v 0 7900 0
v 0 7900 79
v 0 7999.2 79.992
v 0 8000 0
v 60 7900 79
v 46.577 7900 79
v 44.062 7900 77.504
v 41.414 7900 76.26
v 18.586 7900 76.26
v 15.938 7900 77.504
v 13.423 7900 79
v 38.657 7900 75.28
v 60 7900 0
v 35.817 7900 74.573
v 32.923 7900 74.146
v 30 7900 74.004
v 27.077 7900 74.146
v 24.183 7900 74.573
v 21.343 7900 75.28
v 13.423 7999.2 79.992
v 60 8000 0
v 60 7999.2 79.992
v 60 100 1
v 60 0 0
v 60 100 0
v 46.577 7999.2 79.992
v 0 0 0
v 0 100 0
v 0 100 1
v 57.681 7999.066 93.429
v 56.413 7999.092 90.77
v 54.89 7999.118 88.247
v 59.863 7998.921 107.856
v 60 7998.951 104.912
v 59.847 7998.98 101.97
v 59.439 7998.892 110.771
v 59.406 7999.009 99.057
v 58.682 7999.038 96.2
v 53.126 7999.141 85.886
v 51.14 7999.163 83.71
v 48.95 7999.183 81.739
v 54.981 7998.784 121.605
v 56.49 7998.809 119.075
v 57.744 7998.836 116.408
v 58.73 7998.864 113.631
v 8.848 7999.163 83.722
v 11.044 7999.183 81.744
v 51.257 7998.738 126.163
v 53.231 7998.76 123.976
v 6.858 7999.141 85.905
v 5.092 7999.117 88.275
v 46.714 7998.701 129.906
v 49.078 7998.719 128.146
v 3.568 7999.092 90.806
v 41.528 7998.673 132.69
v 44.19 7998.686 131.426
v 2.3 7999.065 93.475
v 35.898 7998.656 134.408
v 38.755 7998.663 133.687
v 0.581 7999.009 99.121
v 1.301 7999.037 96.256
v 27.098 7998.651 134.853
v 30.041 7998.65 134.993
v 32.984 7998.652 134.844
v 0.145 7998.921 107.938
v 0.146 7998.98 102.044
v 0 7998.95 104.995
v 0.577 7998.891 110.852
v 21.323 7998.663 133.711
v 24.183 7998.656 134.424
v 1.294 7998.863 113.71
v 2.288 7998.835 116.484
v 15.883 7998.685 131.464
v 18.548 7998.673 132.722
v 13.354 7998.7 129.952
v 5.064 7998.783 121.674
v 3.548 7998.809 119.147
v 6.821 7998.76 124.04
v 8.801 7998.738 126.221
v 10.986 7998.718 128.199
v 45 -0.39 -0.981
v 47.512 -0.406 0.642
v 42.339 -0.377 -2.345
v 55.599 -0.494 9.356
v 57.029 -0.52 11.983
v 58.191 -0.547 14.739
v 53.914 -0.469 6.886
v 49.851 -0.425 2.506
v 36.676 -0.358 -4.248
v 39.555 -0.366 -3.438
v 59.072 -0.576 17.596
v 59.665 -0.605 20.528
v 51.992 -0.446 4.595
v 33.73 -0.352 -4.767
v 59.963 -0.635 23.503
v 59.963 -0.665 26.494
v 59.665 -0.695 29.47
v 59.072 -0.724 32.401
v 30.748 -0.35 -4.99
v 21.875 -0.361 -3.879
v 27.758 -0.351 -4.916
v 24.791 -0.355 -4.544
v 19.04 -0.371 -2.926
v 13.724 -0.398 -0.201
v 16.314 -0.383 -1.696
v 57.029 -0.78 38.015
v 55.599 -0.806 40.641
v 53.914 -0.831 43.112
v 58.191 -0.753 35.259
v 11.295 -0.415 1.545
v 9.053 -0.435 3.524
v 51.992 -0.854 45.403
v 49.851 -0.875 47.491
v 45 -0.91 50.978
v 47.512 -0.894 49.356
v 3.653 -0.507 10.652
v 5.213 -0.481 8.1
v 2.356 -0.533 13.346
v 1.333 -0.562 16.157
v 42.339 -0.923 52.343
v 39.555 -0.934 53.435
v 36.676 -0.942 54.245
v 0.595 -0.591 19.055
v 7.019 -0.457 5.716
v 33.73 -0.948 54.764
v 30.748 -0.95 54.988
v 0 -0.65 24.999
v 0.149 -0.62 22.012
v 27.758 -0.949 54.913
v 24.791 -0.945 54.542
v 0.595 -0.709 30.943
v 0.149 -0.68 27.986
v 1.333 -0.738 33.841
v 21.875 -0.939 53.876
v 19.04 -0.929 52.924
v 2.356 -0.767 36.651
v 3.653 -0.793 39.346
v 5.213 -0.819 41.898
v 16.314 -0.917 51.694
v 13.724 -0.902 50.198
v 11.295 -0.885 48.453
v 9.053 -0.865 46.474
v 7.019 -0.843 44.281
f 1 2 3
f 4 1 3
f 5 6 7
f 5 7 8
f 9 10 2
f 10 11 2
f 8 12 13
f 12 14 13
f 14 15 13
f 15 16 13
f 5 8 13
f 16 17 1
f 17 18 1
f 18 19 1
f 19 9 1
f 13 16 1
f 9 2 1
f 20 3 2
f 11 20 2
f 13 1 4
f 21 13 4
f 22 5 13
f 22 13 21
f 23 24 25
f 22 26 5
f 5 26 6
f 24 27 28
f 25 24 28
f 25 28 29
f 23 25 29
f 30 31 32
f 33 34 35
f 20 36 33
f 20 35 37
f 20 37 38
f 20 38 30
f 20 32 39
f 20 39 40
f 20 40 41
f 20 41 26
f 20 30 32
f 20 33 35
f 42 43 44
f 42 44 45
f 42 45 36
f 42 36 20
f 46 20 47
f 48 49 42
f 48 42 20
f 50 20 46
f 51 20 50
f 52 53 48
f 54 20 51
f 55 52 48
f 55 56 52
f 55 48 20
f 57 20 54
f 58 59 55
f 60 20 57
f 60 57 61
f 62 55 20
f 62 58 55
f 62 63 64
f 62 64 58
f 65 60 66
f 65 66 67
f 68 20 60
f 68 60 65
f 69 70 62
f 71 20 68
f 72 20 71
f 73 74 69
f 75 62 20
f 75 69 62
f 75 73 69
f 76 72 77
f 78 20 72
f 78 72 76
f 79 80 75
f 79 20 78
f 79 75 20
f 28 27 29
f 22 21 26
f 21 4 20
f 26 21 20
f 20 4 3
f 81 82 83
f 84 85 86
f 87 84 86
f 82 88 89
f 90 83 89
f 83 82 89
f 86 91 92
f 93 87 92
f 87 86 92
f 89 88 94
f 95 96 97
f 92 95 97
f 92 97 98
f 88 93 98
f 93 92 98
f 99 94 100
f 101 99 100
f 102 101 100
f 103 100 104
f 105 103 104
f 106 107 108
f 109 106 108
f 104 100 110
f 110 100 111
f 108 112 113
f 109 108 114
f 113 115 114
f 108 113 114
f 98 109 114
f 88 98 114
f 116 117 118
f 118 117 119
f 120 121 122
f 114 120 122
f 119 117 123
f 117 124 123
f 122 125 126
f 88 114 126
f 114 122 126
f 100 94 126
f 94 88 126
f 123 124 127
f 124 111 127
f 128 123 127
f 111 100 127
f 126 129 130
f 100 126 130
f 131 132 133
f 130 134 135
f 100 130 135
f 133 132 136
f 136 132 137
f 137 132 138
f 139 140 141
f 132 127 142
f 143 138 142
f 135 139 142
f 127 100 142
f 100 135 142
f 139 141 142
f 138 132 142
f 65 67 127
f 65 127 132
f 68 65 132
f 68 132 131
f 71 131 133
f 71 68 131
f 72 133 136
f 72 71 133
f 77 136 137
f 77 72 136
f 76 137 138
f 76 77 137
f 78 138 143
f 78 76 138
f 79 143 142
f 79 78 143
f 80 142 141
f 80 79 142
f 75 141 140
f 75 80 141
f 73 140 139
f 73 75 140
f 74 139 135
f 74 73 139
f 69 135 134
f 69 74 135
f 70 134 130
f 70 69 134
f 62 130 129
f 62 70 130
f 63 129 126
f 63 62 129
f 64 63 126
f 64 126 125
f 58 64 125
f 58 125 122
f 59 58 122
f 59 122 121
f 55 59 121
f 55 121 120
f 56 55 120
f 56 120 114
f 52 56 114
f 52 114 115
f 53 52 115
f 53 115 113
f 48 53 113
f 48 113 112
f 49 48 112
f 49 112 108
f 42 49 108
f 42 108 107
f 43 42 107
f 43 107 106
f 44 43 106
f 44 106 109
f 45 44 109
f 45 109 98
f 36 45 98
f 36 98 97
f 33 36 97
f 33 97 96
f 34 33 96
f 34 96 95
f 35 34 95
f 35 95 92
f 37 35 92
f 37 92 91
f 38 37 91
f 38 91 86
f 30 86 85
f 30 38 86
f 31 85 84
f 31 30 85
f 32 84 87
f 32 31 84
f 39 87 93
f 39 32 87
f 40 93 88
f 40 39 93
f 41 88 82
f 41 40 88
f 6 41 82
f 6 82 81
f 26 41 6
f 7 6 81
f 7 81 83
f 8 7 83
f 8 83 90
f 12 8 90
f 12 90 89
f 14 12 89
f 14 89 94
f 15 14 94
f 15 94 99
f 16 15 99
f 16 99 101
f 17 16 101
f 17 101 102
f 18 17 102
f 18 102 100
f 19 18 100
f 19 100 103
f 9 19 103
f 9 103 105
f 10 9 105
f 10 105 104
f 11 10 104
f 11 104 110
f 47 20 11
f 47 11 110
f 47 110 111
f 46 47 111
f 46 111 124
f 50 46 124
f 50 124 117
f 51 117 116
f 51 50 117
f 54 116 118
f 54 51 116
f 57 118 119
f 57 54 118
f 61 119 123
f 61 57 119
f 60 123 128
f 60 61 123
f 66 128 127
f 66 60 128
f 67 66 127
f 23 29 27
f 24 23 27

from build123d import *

# Parameters (mm, degrees)
F1_DEPTH = 60
F2_R     = 30
F3_DEPTH = 8000


with BuildPart() as f1:
    # F0 (on Right) → F1 (new body)
    with BuildSketch(Plane.YZ):
        Polygon((100, 1), (0, 0), (100, 0), align=None)
    extrude(amount=F1_DEPTH)


with BuildPart() as f1b:
    # F0 (on Right) → F1, piece 2 (new body)
    with BuildSketch(Plane.YZ):
        Polygon((7999.200079992, 79.9920007999), (7900, 79), (7900, 0), (8000, 0), align=None)
    extrude(amount=F1_DEPTH)

    # F2 (on face) → F3 (join)
    with BuildSketch(Plane(origin=(0, 7999.200079992, 79.9920007999), x_dir=(-1, 0, 0), z_dir=(0, 0.9999500037, 0.0099995))):
        with Locations((-30, 25.0039997)):
            Circle(F2_R)
    extrude(amount=-F3_DEPTH)


solid = Compound([f1.part, f1b.part])
